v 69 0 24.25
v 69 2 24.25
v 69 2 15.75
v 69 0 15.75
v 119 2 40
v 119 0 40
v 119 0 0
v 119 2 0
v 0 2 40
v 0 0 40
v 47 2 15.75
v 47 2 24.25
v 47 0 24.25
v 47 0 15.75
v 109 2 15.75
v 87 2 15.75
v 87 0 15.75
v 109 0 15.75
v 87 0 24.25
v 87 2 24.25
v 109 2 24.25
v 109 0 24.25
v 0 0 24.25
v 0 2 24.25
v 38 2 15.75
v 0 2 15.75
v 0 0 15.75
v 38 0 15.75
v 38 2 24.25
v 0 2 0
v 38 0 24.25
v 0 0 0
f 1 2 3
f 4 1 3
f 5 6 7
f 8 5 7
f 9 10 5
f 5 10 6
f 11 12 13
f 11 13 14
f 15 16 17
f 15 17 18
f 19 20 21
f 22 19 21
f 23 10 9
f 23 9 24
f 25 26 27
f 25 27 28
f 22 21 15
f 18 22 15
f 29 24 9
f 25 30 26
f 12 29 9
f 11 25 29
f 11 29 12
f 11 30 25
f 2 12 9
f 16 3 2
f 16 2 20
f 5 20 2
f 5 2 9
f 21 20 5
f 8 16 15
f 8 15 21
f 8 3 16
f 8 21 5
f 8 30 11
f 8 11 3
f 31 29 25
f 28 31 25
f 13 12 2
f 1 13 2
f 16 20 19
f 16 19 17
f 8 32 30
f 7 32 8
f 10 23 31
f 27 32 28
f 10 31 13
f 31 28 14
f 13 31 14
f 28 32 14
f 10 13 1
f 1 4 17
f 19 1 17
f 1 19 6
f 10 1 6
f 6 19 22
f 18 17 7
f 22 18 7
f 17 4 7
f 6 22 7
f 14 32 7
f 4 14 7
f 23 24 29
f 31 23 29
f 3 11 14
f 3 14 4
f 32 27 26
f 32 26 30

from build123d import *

# Parameters (mm, degrees)
SKETCH1_W           = 119
SKETCH1_H           = 40
BOSS_EXTRUDE1_DEPTH = 2
SKETCH2_W           = 38
SKETCH2_H           = 8.5
CUT_EXTRUDE1_DEPTH  = 3
SKETCH3_W           = 22
SKETCH3_H           = 8.5
CUT_EXTRUDE2_DEPTH  = 3


with BuildPart() as part:
    # Sketch1 → Boss-Extrude1 (new body)
    with BuildSketch(Plane(origin=(0, 0, 0), x_dir=(1, 0, 0), z_dir=(0, 1, 0))):
        with Locations((59.5, -20)):
            Rectangle(SKETCH1_W, SKETCH1_H)
    extrude(amount=BOSS_EXTRUDE1_DEPTH)

    # Sketch2 → Cut-Extrude1 (cut, through all)
    with BuildSketch(Plane(origin=(0, 2, 0), x_dir=(1, 0, 0), z_dir=(0, 1, 0))):
        with Locations((19, -20)):
            Rectangle(SKETCH2_W, SKETCH2_H)
    extrude(amount=-CUT_EXTRUDE1_DEPTH, mode=Mode.SUBTRACT)

    # Sketch3 → Cut-Extrude2 (cut, through all)
    with BuildSketch(Plane(origin=(0, 2, 0), x_dir=(1, 0, 0), z_dir=(0, 1, 0))):
        with Locations((58, -20)):
            Rectangle(SKETCH3_W, SKETCH3_H)
        with Locations((98, -20)):
            Rectangle(SKETCH3_W, SKETCH3_H)
    extrude(amount=-CUT_EXTRUDE2_DEPTH, mode=Mode.SUBTRACT)


solid = part.part
